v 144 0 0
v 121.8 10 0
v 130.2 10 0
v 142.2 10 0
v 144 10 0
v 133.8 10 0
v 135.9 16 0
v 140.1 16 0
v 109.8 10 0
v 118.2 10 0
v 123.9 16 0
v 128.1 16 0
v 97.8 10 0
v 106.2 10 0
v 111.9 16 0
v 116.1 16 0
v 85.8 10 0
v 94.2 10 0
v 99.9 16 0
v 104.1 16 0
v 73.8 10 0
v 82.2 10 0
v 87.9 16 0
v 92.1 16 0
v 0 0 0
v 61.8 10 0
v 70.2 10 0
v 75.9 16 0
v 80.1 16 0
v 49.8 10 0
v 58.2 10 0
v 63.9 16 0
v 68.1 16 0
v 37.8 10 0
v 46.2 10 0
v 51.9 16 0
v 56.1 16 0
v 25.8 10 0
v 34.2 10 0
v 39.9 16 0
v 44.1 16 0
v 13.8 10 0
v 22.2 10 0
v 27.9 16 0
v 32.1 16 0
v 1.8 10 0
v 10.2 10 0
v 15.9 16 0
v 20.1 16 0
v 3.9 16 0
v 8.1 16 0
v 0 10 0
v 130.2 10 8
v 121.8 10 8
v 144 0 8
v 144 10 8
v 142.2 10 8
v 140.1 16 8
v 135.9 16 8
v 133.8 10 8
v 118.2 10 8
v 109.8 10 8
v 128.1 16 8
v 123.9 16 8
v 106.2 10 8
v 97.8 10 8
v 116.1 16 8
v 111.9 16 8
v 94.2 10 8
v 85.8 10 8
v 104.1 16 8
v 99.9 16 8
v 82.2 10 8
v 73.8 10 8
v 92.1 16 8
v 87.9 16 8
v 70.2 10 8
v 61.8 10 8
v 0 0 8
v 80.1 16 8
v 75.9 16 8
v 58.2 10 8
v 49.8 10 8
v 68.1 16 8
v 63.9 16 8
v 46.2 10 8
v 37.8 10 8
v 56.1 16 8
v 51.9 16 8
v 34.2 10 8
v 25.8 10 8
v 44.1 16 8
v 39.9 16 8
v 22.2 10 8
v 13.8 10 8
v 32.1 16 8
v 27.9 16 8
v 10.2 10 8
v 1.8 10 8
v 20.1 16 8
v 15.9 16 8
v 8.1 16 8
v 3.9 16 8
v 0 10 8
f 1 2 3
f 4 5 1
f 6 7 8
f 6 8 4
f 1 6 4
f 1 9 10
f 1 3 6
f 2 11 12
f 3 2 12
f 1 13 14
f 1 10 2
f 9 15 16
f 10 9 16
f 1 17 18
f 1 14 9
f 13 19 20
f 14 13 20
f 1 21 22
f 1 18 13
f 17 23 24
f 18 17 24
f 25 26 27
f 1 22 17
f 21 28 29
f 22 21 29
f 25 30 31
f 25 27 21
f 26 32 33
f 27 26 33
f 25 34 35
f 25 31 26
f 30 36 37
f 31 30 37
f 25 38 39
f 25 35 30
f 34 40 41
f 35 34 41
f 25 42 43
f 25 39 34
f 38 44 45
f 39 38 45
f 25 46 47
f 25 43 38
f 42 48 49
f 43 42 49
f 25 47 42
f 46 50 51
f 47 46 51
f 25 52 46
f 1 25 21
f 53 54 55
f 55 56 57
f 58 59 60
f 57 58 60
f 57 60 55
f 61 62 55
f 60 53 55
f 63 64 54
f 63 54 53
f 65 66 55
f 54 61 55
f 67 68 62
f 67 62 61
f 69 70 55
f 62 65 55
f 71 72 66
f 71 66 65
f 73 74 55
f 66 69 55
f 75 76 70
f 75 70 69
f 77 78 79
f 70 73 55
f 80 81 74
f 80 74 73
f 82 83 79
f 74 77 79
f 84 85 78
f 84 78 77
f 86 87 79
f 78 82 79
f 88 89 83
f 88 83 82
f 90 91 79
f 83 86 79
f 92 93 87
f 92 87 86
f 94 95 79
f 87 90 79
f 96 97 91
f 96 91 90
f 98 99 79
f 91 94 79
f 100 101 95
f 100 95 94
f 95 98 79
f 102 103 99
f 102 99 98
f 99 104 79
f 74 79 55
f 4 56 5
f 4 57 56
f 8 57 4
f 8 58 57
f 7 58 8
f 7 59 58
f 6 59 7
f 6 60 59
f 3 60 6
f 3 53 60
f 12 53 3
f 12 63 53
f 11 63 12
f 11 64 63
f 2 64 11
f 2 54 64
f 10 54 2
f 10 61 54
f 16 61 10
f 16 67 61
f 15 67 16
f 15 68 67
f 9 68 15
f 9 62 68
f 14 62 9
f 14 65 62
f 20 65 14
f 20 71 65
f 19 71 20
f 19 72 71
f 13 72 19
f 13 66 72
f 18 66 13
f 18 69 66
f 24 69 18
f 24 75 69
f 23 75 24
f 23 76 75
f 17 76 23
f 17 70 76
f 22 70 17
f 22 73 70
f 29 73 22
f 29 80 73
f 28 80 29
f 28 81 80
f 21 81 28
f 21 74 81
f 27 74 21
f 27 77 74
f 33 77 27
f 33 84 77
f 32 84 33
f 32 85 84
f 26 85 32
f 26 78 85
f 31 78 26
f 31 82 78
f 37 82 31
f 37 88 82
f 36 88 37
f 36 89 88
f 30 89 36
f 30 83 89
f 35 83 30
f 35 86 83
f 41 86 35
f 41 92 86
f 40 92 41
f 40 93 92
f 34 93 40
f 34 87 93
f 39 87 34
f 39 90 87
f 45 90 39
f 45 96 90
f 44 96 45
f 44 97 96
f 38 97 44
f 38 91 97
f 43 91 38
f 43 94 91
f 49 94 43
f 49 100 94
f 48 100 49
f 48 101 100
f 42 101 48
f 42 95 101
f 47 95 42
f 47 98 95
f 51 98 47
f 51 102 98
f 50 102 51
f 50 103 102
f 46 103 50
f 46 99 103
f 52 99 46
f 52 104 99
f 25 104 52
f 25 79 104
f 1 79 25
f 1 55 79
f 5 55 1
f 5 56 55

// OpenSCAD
$fn = 32;

// ----------------------------------------------------------------------
// Gear rack: 12 teeth, pitch 12 mm
// ----------------------------------------------------------------------

// --- parameters (mm) ---
teeth = 12;               // number of teeth
pitch = 12;               // tooth pitch, X
root_w = 8.4;             // tooth width at the root
tip_w = 4.2;              // tooth width at the tip
base_h = 10;              // rack body height, Y
tooth_h = 6;              // tooth height above the body
plate_t = 8;              // rack width, Z (extrusion height)

rack_l = teeth * pitch;  // overall length
total_h = base_h + tooth_h;  // overall height

profile = [[0, 0], [144, 0], [144, 10], [142.2, 10], [140.1, 16], [135.9, 16], [133.8, 10], [130.2, 10], [128.1, 16], [123.9, 16], [121.8, 10], [118.2, 10], [116.1, 16], [111.9, 16], [109.8, 10], [106.2, 10], [104.1, 16], [99.9, 16], [97.8, 10], [94.2, 10], [92.1, 16], [87.9, 16], [85.8, 10], [82.2, 10], [80.1, 16], [75.9, 16], [73.8, 10], [70.2, 10], [68.1, 16], [63.9, 16], [61.8, 10], [58.2, 10], [56.1, 16], [51.9, 16], [49.8, 10], [46.2, 10], [44.1, 16], [39.9, 16], [37.8, 10], [34.2, 10], [32.1, 16], [27.9, 16], [25.8, 10], [22.2, 10], [20.1, 16], [15.9, 16], [13.8, 10], [10.2, 10], [8.1, 16], [3.9, 16], [1.8, 10], [0, 10]];  // primary outline, 52 points, counter clockwise

// --- the one profile operation ---
linear_extrude(height = plate_t) polygon(points = profile);
